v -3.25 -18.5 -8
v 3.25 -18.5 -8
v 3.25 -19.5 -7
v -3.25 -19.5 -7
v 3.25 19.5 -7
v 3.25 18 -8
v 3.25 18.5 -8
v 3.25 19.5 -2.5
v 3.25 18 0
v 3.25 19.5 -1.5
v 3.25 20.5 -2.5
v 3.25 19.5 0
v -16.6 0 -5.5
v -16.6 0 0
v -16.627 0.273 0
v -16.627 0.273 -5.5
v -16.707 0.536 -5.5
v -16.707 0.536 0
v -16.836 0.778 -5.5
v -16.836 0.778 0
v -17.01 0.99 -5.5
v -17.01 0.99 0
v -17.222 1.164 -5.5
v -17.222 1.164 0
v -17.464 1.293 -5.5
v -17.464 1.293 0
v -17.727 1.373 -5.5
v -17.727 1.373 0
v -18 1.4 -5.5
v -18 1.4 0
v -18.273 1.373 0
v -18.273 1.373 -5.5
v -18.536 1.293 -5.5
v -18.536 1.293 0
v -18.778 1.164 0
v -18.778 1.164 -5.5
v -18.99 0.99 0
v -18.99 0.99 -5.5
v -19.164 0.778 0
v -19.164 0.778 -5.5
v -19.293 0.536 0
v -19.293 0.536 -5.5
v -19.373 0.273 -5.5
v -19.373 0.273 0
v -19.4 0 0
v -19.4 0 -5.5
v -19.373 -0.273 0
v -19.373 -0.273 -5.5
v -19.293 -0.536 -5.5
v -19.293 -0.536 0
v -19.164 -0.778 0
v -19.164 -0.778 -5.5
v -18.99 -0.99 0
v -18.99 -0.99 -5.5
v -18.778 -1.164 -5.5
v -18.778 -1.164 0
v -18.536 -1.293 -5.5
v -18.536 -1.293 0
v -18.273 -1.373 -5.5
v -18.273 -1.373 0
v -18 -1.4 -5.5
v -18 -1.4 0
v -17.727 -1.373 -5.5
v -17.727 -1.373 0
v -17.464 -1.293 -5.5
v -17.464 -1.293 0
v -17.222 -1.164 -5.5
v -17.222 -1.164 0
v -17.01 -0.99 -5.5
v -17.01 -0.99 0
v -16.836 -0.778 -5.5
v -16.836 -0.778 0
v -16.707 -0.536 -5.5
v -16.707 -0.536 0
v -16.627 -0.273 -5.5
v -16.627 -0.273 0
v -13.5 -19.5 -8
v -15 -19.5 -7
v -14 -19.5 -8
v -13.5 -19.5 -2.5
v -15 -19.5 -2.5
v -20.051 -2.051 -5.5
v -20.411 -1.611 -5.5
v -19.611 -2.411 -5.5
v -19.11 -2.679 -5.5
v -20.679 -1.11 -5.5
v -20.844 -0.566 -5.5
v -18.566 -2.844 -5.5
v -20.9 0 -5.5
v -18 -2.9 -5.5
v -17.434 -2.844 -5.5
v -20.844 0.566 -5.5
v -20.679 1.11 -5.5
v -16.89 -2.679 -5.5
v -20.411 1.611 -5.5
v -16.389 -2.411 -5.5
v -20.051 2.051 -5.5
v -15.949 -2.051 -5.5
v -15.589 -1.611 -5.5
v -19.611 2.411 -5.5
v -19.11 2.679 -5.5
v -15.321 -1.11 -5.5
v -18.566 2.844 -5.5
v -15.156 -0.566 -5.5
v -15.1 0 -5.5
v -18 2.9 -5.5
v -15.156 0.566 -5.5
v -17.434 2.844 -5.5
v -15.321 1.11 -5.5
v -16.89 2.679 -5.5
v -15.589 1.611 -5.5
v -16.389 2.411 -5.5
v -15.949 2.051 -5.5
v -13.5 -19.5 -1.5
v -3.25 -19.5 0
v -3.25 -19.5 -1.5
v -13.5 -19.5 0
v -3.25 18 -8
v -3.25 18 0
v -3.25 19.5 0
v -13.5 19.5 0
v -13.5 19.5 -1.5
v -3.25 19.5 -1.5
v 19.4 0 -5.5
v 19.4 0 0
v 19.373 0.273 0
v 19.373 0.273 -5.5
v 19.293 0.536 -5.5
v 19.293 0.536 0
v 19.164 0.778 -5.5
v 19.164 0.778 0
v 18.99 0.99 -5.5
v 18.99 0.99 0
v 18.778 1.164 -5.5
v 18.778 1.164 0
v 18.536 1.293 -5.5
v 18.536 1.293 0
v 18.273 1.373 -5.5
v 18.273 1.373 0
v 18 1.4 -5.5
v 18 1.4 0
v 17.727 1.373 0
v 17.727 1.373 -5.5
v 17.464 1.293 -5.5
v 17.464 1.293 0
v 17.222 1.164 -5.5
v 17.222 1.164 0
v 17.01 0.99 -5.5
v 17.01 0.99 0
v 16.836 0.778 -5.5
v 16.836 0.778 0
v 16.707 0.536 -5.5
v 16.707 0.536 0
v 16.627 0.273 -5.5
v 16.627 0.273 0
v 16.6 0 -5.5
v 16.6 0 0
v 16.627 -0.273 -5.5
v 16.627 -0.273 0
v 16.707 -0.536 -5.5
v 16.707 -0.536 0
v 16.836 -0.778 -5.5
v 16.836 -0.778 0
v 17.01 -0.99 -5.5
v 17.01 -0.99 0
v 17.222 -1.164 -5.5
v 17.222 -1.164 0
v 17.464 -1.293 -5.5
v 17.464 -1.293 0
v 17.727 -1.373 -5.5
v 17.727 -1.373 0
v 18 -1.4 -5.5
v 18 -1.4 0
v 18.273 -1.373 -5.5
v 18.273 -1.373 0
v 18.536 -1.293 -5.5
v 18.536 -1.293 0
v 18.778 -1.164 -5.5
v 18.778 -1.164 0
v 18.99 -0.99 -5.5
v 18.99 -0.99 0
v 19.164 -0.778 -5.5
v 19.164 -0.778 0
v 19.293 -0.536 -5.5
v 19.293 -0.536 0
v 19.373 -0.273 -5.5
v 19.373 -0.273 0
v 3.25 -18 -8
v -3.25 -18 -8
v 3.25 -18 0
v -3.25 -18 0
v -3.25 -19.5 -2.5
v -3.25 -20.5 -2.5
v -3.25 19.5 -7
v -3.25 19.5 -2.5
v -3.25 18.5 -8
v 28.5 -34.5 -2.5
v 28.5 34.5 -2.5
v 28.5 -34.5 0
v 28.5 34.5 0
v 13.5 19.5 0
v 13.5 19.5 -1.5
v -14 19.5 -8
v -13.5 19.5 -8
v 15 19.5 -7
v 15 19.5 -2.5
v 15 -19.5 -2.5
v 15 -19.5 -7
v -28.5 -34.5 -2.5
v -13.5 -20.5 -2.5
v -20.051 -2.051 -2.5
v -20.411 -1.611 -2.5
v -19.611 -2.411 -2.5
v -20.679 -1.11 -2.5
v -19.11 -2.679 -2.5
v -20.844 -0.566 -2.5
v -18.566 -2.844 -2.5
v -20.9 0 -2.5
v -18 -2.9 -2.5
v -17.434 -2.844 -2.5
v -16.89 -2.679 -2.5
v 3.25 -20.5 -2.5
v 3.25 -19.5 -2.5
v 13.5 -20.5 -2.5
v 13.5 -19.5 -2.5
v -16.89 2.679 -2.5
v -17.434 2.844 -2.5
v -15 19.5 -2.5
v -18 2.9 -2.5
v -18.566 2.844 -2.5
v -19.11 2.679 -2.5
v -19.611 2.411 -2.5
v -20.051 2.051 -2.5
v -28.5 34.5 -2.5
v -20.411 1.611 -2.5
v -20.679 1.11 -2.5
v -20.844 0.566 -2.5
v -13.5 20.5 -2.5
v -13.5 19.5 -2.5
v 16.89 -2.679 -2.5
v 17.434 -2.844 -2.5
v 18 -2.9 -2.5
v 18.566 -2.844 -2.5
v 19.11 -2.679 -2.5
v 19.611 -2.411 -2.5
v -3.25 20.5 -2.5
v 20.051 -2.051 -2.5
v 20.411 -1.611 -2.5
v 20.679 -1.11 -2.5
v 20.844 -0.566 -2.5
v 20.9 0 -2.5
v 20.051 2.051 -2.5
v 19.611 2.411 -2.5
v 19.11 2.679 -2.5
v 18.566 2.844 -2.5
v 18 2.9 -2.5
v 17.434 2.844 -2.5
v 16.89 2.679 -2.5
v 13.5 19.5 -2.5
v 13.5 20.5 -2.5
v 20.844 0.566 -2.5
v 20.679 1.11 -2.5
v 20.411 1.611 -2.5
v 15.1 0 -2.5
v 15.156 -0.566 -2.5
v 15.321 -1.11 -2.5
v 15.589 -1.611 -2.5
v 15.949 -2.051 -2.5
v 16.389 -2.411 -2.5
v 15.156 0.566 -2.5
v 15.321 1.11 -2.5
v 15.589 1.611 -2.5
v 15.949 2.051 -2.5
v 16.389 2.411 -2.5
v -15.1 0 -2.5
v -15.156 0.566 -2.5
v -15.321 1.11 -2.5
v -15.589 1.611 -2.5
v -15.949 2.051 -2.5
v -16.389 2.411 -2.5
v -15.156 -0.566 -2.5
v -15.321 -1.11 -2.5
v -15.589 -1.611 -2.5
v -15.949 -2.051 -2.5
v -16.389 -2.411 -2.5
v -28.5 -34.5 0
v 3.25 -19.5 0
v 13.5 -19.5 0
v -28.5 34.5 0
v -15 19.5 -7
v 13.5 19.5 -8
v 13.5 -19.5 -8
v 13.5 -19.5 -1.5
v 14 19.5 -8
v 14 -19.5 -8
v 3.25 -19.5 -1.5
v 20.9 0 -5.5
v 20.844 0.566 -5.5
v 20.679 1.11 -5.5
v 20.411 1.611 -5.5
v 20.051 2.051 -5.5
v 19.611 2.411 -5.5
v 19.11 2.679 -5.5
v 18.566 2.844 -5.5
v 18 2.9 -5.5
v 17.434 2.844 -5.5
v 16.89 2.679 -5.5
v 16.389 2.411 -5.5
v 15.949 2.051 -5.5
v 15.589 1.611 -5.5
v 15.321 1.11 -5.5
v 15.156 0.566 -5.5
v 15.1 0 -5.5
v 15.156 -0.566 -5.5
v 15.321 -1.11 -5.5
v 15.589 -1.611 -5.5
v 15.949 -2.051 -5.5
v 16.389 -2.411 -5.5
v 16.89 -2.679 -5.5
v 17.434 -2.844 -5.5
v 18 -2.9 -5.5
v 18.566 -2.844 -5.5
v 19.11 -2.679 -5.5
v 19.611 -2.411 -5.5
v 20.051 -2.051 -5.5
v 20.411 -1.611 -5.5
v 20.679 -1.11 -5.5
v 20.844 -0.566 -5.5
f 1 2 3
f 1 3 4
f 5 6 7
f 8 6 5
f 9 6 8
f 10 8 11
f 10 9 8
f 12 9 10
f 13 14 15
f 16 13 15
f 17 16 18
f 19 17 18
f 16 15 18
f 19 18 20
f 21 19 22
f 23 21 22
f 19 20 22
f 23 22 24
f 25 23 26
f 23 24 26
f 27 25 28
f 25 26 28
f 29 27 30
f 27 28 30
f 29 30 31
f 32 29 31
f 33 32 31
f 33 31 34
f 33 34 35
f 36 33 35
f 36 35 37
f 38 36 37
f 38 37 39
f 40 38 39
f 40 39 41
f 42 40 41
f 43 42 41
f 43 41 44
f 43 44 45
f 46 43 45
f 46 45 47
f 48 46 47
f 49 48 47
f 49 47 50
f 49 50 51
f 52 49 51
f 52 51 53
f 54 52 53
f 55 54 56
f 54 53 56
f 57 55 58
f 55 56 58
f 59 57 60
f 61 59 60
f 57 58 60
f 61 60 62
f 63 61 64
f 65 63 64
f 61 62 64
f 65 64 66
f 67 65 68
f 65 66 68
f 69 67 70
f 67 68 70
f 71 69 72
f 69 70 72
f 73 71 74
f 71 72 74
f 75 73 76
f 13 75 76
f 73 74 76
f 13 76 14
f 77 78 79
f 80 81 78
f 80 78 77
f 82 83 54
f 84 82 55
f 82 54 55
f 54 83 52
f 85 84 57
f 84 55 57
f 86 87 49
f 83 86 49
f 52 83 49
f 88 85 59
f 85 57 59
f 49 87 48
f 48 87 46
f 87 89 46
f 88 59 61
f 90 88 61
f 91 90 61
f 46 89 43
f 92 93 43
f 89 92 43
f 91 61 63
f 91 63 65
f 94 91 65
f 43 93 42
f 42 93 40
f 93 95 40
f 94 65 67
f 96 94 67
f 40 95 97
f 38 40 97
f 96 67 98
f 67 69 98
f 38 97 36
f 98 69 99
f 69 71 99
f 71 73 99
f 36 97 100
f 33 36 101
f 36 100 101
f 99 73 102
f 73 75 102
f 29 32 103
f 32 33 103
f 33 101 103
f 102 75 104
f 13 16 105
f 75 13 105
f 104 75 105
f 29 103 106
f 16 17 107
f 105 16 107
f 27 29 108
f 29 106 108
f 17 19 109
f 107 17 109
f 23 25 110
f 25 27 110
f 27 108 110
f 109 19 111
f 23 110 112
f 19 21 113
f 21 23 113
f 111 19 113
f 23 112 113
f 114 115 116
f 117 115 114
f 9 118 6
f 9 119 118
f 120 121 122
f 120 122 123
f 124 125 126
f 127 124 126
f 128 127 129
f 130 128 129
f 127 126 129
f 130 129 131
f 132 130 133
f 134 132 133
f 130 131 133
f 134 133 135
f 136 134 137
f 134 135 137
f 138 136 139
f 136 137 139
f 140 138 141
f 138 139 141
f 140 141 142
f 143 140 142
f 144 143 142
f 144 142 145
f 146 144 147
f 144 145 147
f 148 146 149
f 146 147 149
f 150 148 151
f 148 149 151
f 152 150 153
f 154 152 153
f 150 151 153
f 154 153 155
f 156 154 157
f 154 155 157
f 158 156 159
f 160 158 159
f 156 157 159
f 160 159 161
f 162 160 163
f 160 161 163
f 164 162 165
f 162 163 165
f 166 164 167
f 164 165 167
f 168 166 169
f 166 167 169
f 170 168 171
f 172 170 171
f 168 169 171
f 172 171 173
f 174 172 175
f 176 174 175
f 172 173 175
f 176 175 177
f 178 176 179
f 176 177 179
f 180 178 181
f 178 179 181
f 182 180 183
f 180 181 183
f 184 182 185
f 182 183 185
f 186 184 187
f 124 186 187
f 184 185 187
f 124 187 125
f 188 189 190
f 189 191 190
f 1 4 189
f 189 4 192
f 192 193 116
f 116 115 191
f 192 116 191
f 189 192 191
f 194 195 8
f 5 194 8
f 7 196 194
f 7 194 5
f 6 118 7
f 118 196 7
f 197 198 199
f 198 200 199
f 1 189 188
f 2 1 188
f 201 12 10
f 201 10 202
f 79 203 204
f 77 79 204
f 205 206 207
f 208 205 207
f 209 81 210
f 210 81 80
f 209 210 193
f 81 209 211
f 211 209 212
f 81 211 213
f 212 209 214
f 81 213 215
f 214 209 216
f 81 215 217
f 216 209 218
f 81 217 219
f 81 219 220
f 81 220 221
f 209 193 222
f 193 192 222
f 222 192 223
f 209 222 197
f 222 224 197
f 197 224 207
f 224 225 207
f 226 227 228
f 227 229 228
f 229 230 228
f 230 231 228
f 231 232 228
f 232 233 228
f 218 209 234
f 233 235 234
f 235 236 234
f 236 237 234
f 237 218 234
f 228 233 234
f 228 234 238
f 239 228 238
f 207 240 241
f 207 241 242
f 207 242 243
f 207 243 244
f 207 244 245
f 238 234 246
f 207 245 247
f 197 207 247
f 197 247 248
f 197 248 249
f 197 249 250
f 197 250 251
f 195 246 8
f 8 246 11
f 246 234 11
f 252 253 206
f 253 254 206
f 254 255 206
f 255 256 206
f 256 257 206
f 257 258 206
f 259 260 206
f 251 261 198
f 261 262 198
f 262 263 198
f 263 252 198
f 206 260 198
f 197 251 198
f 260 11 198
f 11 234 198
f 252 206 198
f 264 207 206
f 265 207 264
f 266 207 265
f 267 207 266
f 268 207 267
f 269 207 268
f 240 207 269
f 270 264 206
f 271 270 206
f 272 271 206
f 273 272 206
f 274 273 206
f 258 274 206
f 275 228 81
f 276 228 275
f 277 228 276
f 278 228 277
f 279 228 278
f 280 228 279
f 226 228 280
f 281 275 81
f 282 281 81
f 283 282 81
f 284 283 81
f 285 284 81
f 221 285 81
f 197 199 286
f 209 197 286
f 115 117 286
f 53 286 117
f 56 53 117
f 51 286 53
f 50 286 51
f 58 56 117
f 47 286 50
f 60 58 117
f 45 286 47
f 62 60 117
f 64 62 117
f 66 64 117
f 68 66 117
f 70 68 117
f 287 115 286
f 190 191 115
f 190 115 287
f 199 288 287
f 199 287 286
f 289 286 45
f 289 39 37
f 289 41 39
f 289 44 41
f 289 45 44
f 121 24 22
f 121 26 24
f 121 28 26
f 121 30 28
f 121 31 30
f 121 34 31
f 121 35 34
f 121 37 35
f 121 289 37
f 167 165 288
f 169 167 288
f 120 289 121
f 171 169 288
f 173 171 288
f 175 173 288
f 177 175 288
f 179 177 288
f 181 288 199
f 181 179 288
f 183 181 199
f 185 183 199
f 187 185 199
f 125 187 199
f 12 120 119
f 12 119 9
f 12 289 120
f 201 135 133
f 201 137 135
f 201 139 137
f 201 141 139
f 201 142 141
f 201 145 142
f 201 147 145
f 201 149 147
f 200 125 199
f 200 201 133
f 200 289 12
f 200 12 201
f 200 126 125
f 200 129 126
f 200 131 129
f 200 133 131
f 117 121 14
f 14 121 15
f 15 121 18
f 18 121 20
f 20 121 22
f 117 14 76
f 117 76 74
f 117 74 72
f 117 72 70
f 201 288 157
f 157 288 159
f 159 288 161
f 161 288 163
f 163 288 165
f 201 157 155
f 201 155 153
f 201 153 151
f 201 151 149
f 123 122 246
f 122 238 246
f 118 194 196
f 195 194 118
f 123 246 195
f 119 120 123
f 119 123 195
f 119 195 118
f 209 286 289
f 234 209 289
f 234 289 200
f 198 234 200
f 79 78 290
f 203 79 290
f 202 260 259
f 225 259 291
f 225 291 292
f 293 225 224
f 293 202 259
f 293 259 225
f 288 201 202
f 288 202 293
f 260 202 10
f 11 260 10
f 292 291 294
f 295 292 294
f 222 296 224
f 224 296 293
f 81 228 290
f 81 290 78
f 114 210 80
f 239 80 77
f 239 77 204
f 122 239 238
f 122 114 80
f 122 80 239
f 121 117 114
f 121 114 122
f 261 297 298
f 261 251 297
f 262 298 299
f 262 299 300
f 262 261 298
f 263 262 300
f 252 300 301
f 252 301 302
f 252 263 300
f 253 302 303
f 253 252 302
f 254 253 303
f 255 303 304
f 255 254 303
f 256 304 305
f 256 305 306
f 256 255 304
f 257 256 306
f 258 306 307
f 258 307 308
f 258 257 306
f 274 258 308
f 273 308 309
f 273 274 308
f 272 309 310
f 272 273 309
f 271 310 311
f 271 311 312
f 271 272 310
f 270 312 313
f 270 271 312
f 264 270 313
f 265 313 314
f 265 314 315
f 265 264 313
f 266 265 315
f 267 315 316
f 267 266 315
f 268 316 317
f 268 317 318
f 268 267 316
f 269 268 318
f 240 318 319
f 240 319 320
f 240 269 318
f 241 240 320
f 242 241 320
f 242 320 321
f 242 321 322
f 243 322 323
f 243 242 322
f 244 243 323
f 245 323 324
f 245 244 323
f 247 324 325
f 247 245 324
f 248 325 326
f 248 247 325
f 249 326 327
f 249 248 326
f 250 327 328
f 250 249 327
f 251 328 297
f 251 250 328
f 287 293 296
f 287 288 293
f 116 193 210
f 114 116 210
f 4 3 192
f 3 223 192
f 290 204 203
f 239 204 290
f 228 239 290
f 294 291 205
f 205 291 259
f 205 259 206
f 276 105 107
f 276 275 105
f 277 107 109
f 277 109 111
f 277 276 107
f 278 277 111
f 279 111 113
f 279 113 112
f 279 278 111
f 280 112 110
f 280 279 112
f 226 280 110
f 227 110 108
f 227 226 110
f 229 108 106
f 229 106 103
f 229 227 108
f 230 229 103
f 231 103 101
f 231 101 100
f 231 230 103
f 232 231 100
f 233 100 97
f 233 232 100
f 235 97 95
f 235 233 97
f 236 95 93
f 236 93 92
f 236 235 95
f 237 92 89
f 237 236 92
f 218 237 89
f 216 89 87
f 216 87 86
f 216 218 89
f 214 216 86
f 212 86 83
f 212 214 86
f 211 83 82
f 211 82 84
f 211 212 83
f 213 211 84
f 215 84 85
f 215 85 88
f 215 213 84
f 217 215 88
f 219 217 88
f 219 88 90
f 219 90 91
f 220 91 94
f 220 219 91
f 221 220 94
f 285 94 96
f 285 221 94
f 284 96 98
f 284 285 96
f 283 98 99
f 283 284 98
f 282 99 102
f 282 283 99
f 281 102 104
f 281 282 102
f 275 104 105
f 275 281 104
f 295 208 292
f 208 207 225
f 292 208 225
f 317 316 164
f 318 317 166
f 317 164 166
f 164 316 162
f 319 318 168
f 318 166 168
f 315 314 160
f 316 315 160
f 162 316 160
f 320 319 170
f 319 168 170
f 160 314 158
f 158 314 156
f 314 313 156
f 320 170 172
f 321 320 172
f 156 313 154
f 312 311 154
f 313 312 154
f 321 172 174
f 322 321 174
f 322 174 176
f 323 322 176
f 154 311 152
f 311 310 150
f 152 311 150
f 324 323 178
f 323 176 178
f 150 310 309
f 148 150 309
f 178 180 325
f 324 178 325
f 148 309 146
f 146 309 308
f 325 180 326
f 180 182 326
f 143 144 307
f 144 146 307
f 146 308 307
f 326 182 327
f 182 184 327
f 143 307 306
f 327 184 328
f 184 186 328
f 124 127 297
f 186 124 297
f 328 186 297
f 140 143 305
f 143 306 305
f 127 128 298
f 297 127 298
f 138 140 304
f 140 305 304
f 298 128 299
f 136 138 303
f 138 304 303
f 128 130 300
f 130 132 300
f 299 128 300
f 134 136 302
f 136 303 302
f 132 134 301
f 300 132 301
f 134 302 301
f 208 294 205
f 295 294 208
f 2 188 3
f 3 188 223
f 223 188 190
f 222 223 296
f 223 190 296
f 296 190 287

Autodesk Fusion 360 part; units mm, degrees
sketch "Sketch1" plane through (0, 0, 0) normal (0, 0, 1) x (1, 0, 0)
  line L0 (-13.5, 19.5) -> (13.5, 19.5)
  line L1 (13.5, 19.5) -> (13.5, -19.5)
  line L2 (13.5, -19.5) -> (-13.5, -19.5)
  line L3 (-13.5, -19.5) -> (-13.5, 19.5)
  line L4 (-13.5, 19.5) -> (13.5, -19.5) construction
  line L5 (13.5, 19.5) -> (-13.5, -19.5) construction
  line L6 (0, 0) -> (-18, 0) construction
  circle A0 centre (-18, 0) radius 1.4
  circle A1 centre (-18, 0) radius 2.9
  line L7 (0, 50.0244) -> (0, -49.9756) construction
  circle A2 centre (18, 0) radius 2.9
  circle A3 centre (18, 0) radius 1.4
  line L8 (28.5, 34.5) -> (28.5, -34.5)
  line L9 (28.5, -34.5) -> (-28.5, -34.5)
  line L10 (-28.5, -34.5) -> (-28.5, 34.5)
  line L11 (-28.5, 34.5) -> (28.5, 34.5)
  line L12 (-13.5, 19.5) -> (-15, 19.5)
  line L13 (-15, 19.5) -> (-15, -19.5)
  line L14 (-15, -19.5) -> (-13.5, -19.5)
  line L15 (-13.5, -19.5) -> (-13.5, 19.5)
  line L16 (15, -19.5) -> (13.5, -19.5)
  line L17 (15, 19.5) -> (15, -19.5)
  line L18 (13.5, 19.5) -> (15, 19.5)
  line L19 (3.25, 19.5) -> (-3.25, 19.5)
  line L20 (-3.25, 19.5) -> (-3.25, 18)
  line L21 (-3.25, 18) -> (3.25, 18)
  line L22 (3.25, 18) -> (3.25, 19.5)
  line L23 (3.25, 19.5) -> (-3.25, 18) construction
  line L24 (-3.25, 19.5) -> (3.25, 18) construction
  line L25 (-3.25, -19.5) -> (-3.25, -18)
  line L26 (3.25, -18) -> (3.25, -19.5)
  line L27 (-3.25, -18) -> (3.25, -18)
  point P0 (0, 18.75)
  dimension "d2" = 27
  dimension "d3" = 39
  dimension "d4" = -15
  dimension "d5" = 18
  dimension "d6" = 2.8
  dimension "d7" = 1.5
  dimension "d14" = 1.5
  dimension "d19" = 6.5
  dimension "d20" = 1.5
extrude "Extrude1" add sketch "Sketch1" against normal blind 2.5 contours L3 L12 L13 L14 L15 | L1 L16 L17 L18 | A1 | A2 | L8 L9 L10 L11
extrude "Extrude2" add sketch "Sketch1" against normal blind 3 from surface at -2.5 contours A1 | A2
extrude "Extrude3" add sketch "Sketch1" against normal blind 8 contours L3 L12 L13 L14 L15 | L0 L19 L20 L21 L22 | L2 L25 L26 L27 | L1 L16 L17 L18
chamfer "Chamfer2" distance 1 angle 45 2 edges at (15, 0, -8) (-15, 0, -8)
chamfer "Chamfer2" distance 1 angle 45 4 edges at (-8.375, 19.5, -2.5) (8.375, 19.5, -2.5) (8.375, -19.5, -2.5) (-8.375, -19.5, -2.5)
chamfer "Chamfer2" distance 1 angle 45 2 edges at (0, 19.5, -8) (0, -19.5, -8)
equation "d3 = 41 mm - 2 mm"
equation "d5 = ( 36 / 2 ) * 1 mm"
